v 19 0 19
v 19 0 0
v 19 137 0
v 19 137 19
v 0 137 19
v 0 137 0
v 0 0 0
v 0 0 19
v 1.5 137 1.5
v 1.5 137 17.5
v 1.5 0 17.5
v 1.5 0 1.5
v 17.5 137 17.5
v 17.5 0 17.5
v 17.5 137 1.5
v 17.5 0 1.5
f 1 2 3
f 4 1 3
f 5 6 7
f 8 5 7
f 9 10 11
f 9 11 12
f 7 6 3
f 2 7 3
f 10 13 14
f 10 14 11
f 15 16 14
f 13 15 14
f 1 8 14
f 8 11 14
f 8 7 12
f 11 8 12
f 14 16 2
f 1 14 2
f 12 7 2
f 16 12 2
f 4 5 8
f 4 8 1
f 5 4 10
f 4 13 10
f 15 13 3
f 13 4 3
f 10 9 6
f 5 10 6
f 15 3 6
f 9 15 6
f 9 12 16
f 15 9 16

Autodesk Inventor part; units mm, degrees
ref_plane "YZ Plane" through (0, 0, 0) normal (1, 0, 0) x (0, 1, 0)
ref_plane "XZ Plane" through (0, 0, 0) normal (0, 1, 0) x (-1, 0, 0)
ref_plane "XY Plane" through (0, 0, 0) normal (0, 0, 1) x (1, 0, 0)
sketch "Sketch2" plane through (0, 0, 0) normal (0, 0, 1) x (1, 0, 0)
  line L0 (0, 0) -> (19, 0)
  line L1 (19, 0) -> (19, 137)
  line L2 (19, 137) -> (0, 137)
  line L3 (0, 137) -> (0, 0)
  dimension "d9" = 19
  dimension "d10" = 137
extrude "Extrusion1" add sketch "Sketch2" along normal blind 19
sketch "Sketch4" plane through (0, 137, 0) normal (0, 1, 0) x (1, 0, 0)
  line L0 (19, 0) -> (0, 0) projected
  line L1 (0, 0) -> (0, -19) projected
  line L2 (19, -19) -> (0, -19) projected
  line L3 (19, 0) -> (19, -19) projected
  line L4 (1.5, -17.5) -> (1.5, -1.5)
  line L5 (1.5, -1.5) -> (17.5, -1.5)
  line L6 (17.5, -1.5) -> (17.5, -17.5)
  line L7 (17.5, -17.5) -> (1.5, -17.5)
  dimension "d11" = 1.5
extrude "Extrusion3" cut sketch "Sketch4" against normal through all contours L4 L5 L6 L7
properties part number "C009" material "Aluminum 6061"
